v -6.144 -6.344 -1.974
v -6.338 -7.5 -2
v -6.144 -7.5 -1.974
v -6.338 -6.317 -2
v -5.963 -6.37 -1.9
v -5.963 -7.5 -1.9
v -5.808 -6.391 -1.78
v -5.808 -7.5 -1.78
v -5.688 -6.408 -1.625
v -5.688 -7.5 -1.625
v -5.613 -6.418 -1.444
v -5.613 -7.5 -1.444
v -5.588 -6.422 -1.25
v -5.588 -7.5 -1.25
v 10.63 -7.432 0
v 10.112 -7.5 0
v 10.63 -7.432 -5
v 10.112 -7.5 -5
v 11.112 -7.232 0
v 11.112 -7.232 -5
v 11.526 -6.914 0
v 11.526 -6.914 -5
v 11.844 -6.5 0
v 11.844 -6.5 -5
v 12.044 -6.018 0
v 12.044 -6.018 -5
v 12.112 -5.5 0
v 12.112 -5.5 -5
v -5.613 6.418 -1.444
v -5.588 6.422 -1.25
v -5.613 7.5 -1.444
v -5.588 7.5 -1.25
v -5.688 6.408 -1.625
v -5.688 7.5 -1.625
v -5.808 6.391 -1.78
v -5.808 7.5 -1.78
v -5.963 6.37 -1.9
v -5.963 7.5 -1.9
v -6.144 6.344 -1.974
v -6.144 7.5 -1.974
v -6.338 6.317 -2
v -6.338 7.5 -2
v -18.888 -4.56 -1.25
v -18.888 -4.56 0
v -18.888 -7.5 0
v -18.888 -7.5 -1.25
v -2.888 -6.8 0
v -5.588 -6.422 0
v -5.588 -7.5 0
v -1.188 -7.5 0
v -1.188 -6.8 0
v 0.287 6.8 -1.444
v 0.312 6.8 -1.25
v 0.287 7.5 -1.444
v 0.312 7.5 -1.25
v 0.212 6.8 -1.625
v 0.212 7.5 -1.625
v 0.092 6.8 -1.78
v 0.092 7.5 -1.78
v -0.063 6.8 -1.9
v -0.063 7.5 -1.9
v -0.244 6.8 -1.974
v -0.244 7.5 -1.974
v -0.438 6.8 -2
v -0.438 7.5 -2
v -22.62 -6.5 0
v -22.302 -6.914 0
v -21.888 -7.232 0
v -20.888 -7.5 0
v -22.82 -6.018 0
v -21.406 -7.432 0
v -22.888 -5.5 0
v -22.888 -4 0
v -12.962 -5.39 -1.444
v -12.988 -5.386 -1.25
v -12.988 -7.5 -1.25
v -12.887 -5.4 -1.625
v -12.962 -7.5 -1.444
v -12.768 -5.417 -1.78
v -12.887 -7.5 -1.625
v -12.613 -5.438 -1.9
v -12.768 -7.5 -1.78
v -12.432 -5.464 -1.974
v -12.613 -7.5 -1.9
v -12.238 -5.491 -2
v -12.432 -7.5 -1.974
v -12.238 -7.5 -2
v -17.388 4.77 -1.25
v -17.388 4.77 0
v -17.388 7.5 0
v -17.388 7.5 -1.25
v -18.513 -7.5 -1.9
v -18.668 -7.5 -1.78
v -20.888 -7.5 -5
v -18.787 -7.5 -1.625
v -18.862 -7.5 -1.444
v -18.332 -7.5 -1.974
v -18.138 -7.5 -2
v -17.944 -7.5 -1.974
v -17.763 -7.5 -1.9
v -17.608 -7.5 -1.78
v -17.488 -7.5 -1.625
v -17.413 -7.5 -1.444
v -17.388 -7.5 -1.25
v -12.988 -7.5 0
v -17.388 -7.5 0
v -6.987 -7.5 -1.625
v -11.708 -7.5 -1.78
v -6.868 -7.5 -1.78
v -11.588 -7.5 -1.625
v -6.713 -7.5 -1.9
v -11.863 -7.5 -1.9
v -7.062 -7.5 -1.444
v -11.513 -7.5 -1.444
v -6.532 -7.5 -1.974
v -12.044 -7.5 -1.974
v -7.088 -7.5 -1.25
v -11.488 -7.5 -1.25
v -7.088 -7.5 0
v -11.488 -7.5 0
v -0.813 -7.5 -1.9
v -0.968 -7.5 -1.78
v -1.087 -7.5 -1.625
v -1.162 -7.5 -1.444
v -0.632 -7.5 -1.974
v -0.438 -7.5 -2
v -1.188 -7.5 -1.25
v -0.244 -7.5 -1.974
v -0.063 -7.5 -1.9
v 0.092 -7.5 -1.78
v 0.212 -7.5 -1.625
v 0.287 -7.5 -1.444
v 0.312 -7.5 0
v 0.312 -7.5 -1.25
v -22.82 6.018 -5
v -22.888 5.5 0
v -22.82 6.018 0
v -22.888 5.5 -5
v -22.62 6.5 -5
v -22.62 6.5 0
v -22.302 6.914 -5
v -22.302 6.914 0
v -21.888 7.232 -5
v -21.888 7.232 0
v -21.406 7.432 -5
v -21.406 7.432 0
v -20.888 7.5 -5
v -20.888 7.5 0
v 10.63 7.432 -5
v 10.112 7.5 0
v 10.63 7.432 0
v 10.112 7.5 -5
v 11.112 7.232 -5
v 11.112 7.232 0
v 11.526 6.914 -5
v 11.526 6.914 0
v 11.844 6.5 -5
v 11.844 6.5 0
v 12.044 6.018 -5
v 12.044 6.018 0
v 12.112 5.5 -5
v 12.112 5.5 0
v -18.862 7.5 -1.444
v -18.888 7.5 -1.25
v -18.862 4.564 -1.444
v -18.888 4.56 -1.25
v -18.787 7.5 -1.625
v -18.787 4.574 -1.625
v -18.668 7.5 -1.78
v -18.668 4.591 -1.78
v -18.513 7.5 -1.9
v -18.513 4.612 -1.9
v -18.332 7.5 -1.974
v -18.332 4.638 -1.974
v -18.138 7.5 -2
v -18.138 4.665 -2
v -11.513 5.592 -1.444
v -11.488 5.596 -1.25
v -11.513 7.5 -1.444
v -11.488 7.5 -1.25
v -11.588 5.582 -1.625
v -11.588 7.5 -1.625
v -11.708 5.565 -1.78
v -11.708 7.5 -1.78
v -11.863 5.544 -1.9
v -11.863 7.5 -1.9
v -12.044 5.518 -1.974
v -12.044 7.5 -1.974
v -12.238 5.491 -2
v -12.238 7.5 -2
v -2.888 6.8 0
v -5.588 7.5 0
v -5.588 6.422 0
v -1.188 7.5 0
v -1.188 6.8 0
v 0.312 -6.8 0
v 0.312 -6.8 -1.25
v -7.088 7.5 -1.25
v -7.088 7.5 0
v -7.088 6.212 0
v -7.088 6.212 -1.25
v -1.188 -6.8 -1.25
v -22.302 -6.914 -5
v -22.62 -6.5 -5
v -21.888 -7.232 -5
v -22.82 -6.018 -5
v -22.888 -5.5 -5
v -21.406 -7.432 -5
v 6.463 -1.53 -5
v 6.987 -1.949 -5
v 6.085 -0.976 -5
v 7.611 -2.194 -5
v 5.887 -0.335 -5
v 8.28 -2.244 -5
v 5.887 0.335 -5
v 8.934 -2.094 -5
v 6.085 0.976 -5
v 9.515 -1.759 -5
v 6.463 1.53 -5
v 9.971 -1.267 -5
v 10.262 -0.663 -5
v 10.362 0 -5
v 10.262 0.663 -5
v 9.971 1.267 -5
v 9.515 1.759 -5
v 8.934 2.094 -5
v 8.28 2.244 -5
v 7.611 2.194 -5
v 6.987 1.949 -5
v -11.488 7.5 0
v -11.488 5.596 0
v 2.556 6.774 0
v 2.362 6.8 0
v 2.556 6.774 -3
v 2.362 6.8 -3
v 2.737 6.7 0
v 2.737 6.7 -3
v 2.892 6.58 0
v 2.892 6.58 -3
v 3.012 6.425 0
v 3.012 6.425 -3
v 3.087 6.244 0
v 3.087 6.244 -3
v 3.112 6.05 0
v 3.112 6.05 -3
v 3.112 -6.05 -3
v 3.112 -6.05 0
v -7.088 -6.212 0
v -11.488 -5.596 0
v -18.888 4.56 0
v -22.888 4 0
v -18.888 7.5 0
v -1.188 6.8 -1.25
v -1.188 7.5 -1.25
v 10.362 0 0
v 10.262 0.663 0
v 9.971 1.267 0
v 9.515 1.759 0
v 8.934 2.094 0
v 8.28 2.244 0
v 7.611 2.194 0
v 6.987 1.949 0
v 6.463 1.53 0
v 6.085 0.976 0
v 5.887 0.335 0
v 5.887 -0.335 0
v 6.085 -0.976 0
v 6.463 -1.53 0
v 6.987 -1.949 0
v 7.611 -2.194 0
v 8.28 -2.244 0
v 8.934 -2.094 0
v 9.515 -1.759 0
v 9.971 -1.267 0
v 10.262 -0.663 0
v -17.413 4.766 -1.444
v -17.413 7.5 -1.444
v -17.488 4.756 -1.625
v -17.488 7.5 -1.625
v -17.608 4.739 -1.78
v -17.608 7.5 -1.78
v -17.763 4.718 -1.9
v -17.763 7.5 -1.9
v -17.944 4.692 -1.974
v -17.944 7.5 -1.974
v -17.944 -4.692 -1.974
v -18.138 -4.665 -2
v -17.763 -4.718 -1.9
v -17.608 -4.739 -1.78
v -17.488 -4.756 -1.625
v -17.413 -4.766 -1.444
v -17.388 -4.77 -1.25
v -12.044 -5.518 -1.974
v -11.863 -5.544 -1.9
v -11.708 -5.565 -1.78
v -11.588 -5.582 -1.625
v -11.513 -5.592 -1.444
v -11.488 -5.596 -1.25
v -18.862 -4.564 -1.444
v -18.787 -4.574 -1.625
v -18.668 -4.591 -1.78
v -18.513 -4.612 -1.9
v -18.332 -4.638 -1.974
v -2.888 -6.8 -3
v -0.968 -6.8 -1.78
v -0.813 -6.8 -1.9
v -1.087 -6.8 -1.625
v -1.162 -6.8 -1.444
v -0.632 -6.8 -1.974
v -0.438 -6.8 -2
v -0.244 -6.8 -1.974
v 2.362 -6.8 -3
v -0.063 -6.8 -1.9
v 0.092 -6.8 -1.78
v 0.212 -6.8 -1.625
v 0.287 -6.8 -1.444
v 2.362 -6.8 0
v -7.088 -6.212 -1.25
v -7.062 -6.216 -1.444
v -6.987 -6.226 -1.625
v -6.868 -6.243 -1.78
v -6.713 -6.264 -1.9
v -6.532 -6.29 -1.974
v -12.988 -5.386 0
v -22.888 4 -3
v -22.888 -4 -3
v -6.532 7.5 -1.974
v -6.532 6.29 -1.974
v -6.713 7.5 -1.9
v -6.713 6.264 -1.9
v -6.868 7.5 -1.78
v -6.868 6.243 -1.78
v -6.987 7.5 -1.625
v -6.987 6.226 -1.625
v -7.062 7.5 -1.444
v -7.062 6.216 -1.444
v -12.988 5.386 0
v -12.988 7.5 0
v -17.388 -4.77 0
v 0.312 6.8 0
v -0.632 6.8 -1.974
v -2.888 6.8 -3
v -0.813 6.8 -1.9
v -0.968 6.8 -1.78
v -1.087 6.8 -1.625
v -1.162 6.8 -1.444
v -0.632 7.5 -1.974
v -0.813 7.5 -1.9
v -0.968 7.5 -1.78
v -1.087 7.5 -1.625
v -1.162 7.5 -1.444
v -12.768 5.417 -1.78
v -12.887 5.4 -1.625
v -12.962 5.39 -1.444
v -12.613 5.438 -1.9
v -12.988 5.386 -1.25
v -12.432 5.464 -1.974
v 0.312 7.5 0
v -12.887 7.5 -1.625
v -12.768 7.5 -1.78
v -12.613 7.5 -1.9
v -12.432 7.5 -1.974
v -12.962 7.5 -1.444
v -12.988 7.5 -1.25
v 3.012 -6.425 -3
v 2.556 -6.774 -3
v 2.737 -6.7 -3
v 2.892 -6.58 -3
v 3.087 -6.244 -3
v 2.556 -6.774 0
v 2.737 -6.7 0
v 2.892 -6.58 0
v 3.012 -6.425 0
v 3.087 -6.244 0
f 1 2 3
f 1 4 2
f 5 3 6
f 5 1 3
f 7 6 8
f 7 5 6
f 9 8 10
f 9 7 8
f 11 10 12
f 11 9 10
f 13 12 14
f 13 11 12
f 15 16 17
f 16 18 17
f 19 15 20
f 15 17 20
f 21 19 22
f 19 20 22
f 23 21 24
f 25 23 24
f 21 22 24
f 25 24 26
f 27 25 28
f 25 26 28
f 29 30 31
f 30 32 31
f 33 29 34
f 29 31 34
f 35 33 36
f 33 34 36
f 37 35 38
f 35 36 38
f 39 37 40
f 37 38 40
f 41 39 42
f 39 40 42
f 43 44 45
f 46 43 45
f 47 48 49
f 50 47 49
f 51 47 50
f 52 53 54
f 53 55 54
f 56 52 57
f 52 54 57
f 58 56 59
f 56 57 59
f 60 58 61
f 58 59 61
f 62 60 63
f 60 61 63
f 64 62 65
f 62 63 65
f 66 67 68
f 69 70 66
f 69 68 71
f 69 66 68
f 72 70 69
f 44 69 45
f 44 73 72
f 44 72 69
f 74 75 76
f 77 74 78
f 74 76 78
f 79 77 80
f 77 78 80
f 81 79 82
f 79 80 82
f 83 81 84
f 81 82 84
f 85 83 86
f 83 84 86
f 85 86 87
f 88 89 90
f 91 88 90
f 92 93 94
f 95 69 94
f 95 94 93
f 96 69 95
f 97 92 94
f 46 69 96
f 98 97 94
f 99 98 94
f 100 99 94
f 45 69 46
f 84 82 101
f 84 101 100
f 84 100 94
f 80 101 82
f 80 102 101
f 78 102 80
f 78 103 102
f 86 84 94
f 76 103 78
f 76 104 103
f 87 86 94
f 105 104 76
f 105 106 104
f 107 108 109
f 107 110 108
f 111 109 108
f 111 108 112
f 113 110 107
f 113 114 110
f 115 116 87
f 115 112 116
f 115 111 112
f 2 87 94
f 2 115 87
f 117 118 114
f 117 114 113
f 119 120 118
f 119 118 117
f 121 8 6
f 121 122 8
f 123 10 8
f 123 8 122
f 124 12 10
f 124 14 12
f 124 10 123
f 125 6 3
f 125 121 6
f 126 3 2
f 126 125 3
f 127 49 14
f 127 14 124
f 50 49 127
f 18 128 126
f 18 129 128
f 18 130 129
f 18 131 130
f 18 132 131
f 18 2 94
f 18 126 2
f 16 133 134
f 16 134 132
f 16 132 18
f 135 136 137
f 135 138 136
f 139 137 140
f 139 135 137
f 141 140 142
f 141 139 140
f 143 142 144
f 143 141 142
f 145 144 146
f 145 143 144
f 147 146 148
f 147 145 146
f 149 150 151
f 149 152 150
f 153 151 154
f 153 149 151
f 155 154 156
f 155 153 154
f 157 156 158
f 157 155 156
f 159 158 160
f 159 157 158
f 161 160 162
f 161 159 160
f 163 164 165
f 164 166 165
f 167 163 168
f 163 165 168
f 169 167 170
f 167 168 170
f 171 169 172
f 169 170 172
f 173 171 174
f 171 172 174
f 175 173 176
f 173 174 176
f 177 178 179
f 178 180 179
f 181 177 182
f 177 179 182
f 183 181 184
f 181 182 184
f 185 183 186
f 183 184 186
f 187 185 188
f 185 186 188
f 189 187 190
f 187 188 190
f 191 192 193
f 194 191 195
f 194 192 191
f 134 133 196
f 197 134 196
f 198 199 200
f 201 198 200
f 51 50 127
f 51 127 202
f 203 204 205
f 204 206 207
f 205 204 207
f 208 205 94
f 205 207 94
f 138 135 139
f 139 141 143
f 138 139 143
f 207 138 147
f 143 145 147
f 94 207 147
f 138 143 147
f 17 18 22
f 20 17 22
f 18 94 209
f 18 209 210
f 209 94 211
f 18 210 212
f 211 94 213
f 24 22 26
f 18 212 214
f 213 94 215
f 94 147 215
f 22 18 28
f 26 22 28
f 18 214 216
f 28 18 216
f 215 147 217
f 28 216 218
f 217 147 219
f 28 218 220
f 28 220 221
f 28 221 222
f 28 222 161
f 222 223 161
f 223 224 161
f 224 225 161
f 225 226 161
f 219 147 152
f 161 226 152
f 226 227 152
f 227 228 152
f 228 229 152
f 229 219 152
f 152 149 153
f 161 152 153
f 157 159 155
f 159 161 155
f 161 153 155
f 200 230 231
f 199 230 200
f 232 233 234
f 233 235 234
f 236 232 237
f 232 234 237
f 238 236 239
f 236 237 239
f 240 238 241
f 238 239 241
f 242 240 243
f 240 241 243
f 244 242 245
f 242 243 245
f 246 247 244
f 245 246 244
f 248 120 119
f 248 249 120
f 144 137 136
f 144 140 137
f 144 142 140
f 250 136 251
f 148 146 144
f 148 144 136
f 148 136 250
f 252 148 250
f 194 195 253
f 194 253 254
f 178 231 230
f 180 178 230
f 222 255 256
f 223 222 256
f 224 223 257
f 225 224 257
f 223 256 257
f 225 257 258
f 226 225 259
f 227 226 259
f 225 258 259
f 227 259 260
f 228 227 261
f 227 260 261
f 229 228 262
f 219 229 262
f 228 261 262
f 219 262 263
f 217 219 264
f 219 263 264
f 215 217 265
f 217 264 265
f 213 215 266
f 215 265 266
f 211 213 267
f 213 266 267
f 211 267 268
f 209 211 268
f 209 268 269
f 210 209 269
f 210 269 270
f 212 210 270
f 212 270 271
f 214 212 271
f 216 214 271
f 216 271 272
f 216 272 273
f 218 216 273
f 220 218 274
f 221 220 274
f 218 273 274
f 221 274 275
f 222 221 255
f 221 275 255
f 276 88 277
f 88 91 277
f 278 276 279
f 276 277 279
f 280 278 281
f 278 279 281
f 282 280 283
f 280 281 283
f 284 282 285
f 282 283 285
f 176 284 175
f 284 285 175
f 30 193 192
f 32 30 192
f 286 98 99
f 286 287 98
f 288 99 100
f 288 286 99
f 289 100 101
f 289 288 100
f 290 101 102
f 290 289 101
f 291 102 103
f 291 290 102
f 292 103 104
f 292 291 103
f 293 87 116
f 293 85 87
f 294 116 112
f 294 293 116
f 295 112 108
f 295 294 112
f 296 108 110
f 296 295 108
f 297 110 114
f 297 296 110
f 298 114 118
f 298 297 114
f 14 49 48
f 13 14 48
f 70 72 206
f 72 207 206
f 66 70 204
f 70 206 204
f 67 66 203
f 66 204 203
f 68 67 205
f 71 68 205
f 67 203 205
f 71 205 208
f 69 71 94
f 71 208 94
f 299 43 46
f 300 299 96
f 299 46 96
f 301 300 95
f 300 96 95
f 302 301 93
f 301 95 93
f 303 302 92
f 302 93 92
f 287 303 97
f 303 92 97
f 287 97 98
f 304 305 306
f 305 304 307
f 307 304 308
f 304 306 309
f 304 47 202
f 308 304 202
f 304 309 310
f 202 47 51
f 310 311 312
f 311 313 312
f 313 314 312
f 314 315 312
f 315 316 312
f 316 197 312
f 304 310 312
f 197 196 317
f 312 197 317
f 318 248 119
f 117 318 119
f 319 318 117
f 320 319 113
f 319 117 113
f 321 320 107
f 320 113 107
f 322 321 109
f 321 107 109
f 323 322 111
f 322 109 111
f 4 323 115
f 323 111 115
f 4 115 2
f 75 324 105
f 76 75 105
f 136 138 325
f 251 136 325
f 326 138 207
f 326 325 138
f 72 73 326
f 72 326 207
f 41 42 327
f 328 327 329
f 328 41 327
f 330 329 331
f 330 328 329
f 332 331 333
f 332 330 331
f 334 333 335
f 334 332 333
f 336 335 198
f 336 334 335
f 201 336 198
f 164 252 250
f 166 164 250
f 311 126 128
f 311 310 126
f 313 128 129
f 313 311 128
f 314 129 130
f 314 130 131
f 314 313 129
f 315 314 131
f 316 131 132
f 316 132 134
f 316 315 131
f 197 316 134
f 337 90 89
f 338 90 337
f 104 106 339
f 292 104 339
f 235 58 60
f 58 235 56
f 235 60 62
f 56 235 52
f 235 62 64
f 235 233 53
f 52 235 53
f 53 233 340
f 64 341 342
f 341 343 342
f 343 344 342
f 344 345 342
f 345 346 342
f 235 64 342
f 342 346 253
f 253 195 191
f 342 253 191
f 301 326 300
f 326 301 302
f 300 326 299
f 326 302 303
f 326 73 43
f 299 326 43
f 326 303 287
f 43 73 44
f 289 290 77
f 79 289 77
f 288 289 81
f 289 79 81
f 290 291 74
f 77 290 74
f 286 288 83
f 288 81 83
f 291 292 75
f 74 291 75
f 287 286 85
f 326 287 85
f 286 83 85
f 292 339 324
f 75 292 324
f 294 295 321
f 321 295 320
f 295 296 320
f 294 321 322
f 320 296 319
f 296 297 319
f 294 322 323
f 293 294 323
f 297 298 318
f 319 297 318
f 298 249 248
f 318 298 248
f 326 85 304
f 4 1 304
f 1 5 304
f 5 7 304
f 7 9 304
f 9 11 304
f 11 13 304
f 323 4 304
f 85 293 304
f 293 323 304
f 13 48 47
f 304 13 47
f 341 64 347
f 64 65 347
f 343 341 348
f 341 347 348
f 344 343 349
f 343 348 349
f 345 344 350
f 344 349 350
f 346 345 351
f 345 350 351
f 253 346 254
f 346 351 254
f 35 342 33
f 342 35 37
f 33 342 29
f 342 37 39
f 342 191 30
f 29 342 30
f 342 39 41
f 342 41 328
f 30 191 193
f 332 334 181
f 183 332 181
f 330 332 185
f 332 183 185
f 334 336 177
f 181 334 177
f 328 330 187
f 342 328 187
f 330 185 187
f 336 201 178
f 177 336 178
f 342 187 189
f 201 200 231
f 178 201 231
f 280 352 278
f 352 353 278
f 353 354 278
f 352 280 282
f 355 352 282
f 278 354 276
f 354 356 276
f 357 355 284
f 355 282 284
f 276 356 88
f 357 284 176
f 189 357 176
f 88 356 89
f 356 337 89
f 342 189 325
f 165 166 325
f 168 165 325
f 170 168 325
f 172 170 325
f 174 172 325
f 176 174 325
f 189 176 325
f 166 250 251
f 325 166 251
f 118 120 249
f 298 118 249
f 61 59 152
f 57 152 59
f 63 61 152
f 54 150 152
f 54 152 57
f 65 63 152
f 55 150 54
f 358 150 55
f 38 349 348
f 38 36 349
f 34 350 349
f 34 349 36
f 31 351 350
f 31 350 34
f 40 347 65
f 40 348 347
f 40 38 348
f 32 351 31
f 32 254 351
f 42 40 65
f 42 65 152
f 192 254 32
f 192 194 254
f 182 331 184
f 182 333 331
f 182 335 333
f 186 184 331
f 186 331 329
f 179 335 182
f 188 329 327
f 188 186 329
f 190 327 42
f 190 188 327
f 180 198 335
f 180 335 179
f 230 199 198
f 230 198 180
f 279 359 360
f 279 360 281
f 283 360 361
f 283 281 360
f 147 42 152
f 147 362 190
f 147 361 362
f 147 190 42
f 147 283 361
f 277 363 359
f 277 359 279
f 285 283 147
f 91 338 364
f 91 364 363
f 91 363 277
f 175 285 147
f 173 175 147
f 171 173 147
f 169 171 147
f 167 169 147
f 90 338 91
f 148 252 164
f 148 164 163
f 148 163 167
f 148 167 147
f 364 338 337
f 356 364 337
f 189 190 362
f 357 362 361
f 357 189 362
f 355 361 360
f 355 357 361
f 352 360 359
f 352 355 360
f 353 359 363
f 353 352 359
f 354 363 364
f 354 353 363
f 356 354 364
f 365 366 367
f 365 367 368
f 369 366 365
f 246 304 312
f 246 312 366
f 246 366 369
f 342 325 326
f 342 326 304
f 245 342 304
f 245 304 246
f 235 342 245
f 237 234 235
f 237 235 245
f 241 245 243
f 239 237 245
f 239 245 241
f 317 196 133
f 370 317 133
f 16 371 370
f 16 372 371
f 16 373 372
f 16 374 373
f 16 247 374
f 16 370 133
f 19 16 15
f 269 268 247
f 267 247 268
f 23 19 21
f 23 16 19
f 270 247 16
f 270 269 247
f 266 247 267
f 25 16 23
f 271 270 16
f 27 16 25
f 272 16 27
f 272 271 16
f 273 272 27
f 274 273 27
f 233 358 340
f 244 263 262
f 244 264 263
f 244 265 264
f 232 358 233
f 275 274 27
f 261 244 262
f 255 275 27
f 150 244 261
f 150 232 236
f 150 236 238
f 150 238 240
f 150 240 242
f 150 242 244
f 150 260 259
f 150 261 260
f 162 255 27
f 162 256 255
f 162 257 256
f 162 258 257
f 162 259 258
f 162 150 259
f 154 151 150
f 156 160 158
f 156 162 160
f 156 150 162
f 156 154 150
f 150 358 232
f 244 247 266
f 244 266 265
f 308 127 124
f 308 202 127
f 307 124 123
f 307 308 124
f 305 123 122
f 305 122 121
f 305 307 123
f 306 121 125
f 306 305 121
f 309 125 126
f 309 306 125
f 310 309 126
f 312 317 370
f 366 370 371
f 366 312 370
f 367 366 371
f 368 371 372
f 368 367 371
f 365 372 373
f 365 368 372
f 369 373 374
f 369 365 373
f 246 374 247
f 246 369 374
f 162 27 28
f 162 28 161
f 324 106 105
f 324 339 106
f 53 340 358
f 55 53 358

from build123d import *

# Parameters (mm, degrees)
F0_W     = 1.5
F0_H     = 0.7
F0_R     = 2.25
F0_H_2   = 13.6
F0_W_2   = 2.8
F1_DEPTH = 5
F2_DEPTH = 3
F3_DEPTH = 2
F4_R     = 0.74999
F5_R     = 2


# Not quite as in the source:
# - a fillet or chamfer is up to 0.001 mm smaller than in the source, because OpenCascade refuses the exact size


with BuildPart() as f1:
    # F0 (on Top) → F1 (new body)
    with BuildSketch(Plane.XY):
        Polygon((-18.8879279066, 7.5), (-22.8879279066, 7.5), (-22.8879279066, 4), (-18.8879279066, 4.56), align=None)
        Polygon((-17.3879279066, 7.5), (-18.8879279066, 7.5), (-18.8879279066, 4.56), (-17.3879279066, 4.77), align=None)
        Polygon((-18.8879279066, 4.56), (-22.8879279066, 4), (-22.8879279066, -4), (-18.8879279066, -4.56), align=None)
        Polygon((-12.9879279066, 7.5), (-17.3879279066, 7.5), (-17.3879279066, 4.77), (-12.9879279066, 5.386), align=None)
        Polygon((-18.8879279066, -4.56), (-22.8879279066, -4), (-22.8879279066, -7.5), (-18.8879279066, -7.5), align=None)
        Polygon((-11.4879279066, 7.5), (-12.9879279066, 7.5), (-12.9879279066, 5.386), (-11.4879279066, 5.596), align=None)
        Polygon((-17.3879279066, -4.77), (-18.8879279066, -4.56), (-18.8879279066, -7.5), (-17.3879279066, -7.5), align=None)
        Polygon((-7.0879279066, 7.5), (-11.4879279066, 7.5), (-11.4879279066, 5.596), (-7.0879279066, 6.212), align=None)
        Polygon((-12.9879279066, -5.386), (-17.3879279066, -4.77), (-17.3879279066, -7.5), (-12.9879279066, -7.5), align=None)
        Polygon((-5.5879279066, 7.5), (-7.0879279066, 7.5), (-7.0879279066, 6.212), (-5.5879279066, 6.422), align=None)
        Polygon((-11.4879279066, -5.596), (-12.9879279066, -5.386), (-12.9879279066, -7.5), (-11.4879279066, -7.5), align=None)
        Polygon((-1.1879279066, 7.5), (-5.5879279066, 7.5), (-5.5879279066, 6.422), (-2.8879279066, 6.8), (-1.1879279066, 6.8), align=None)
        Polygon((-7.0879279066, -6.212), (-11.4879279066, -5.596), (-11.4879279066, -7.5), (-7.0879279066, -7.5), align=None)
        with Locations((-0.4379279066, 7.15)):
            Rectangle(F0_W, F0_H)
        Polygon((-5.5879279066, -6.422), (-7.0879279066, -6.212), (-7.0879279066, -7.5), (-5.5879279066, -7.5), align=None)
        Polygon((12.1120720934, 7.5), (0.3120720934, 7.5), (0.3120720934, 6.8), (3.1120720934, 6.8), (3.1120720934, -6.8), (0.3120720934, -6.8), (0.3120720934, -7.5), (12.1120720934, -7.5), align=None)
        with Locations((8.1120720934, 0)):
            Circle(F0_R, mode=Mode.SUBTRACT)
        Polygon((-2.8879279066, -6.8), (-5.5879279066, -6.422), (-5.5879279066, -7.5), (-1.1879279066, -7.5), (-1.1879279066, -6.8), align=None)
        with Locations((-0.4379279066, -7.15)):
            Rectangle(F0_W, F0_H)
        with Locations((-0.4379279066, 0)):
            Rectangle(F0_W, F0_H_2)
        Polygon((-5.5879279066, 6.422), (-7.0879279066, 6.212), (-7.0879279066, -6.212), (-5.5879279066, -6.422), align=None)
        Polygon((-17.3879279066, 4.77), (-18.8879279066, 4.56), (-18.8879279066, -4.56), (-17.3879279066, -4.77), align=None)
        Polygon((-12.9879279066, 5.386), (-17.3879279066, 4.77), (-17.3879279066, -4.77), (-12.9879279066, -5.386), align=None)
        Polygon((-7.0879279066, 6.212), (-11.4879279066, 5.596), (-11.4879279066, -5.596), (-7.0879279066, -6.212), align=None)
        Polygon((-11.4879279066, 5.596), (-12.9879279066, 5.386), (-12.9879279066, -5.386), (-11.4879279066, -5.596), align=None)
        Polygon((-2.8879279066, 6.8), (-5.5879279066, 6.422), (-5.5879279066, -6.422), (-2.8879279066, -6.8), (-1.1879279066, -6.8), (-1.1879279066, 6.8), align=None)
        with Locations((1.7120720934, 0)):
            Rectangle(F0_W_2, F0_H_2)
    extrude(amount=-F1_DEPTH)

    # F0 (on Top) → F2 (cut)
    with BuildSketch(Plane.XY):
        Polygon((-18.8879279066, 4.56), (-22.8879279066, 4), (-22.8879279066, -4), (-18.8879279066, -4.56), align=None)
        Polygon((-17.3879279066, 4.77), (-18.8879279066, 4.56), (-18.8879279066, -4.56), (-17.3879279066, -4.77), align=None)
        Polygon((-12.9879279066, 5.386), (-17.3879279066, 4.77), (-17.3879279066, -4.77), (-12.9879279066, -5.386), align=None)
        Polygon((-11.4879279066, 5.596), (-12.9879279066, 5.386), (-12.9879279066, -5.386), (-11.4879279066, -5.596), align=None)
        Polygon((-7.0879279066, 6.212), (-11.4879279066, 5.596), (-11.4879279066, -5.596), (-7.0879279066, -6.212), align=None)
        Polygon((-5.5879279066, 6.422), (-7.0879279066, 6.212), (-7.0879279066, -6.212), (-5.5879279066, -6.422), align=None)
        Polygon((-2.8879279066, 6.8), (-5.5879279066, 6.422), (-5.5879279066, -6.422), (-2.8879279066, -6.8), (-1.1879279066, -6.8), (-1.1879279066, 6.8), align=None)
        with Locations((-0.4379279066, 0)):
            Rectangle(F0_W, F0_H_2)
        with Locations((1.7120720934, 0)):
            Rectangle(F0_W_2, F0_H_2)
    extrude(amount=-F2_DEPTH, mode=Mode.SUBTRACT)

    # F0 (on Top) → F3 (cut)
    with BuildSketch(Plane.XY):
        Polygon((-17.3879279066, 7.5), (-18.8879279066, 7.5), (-18.8879279066, 4.56), (-17.3879279066, 4.77), align=None)
        Polygon((-11.4879279066, 7.5), (-12.9879279066, 7.5), (-12.9879279066, 5.386), (-11.4879279066, 5.596), align=None)
        Polygon((-5.5879279066, 7.5), (-7.0879279066, 7.5), (-7.0879279066, 6.212), (-5.5879279066, 6.422), align=None)
        with Locations((-0.4379279066, -7.15)):
            Rectangle(F0_W, F0_H)
        Polygon((-17.3879279066, -4.77), (-18.8879279066, -4.56), (-18.8879279066, -7.5), (-17.3879279066, -7.5), align=None)
        Polygon((-11.4879279066, -5.596), (-12.9879279066, -5.386), (-12.9879279066, -7.5), (-11.4879279066, -7.5), align=None)
        Polygon((-5.5879279066, -6.422), (-7.0879279066, -6.212), (-7.0879279066, -7.5), (-5.5879279066, -7.5), align=None)
        with Locations((-0.4379279066, 7.15)):
            Rectangle(F0_W, F0_H)
    extrude(amount=-F3_DEPTH, mode=Mode.SUBTRACT)

    # F4 (radius 0.75 in the source; OpenCascade refuses exactly that, so slightly less here)
    f4_edges = [f1.edges().sort_by_distance(p)[0] for p in [
        (-17.387928, -6.135, -2),
        (-11.487928, -6.548, -2),
        (-5.587928, -6.961, -2),
        (0.312072, -7.15, -2),
        (-18.887928, -6.03, -2),
        (-12.987928, -6.443, -2),
        (-7.087928, -6.856, -2),
        (-1.187928, -7.15, -2),
        (-18.887928, 6.03, -2),
        (-12.987928, 6.443, -2),
        (-7.087928, 6.856, -2),
        (-1.187928, 7.15, -2),
        (-17.387928, 6.135, -2),
        (-11.487928, 6.548, -2),
        (-5.587928, 6.961, -2),
        (0.312072, 7.15, -2),
        (3.112072, 6.8, -1.5),
        (3.112072, -6.8, -1.5),
    ]]
    fillet(f4_edges, radius=F4_R)

    # F5
    f5_edges = [f1.edges().sort_by_distance(p)[0] for p in [
        (-22.887928, -7.5, -2.5),
        (-22.887928, 7.5, -2.5),
        (12.112072, -7.5, -2.5),
        (12.112072, 7.5, -2.5),
    ]]
    fillet(f5_edges, radius=F5_R)


solid = f1.part
